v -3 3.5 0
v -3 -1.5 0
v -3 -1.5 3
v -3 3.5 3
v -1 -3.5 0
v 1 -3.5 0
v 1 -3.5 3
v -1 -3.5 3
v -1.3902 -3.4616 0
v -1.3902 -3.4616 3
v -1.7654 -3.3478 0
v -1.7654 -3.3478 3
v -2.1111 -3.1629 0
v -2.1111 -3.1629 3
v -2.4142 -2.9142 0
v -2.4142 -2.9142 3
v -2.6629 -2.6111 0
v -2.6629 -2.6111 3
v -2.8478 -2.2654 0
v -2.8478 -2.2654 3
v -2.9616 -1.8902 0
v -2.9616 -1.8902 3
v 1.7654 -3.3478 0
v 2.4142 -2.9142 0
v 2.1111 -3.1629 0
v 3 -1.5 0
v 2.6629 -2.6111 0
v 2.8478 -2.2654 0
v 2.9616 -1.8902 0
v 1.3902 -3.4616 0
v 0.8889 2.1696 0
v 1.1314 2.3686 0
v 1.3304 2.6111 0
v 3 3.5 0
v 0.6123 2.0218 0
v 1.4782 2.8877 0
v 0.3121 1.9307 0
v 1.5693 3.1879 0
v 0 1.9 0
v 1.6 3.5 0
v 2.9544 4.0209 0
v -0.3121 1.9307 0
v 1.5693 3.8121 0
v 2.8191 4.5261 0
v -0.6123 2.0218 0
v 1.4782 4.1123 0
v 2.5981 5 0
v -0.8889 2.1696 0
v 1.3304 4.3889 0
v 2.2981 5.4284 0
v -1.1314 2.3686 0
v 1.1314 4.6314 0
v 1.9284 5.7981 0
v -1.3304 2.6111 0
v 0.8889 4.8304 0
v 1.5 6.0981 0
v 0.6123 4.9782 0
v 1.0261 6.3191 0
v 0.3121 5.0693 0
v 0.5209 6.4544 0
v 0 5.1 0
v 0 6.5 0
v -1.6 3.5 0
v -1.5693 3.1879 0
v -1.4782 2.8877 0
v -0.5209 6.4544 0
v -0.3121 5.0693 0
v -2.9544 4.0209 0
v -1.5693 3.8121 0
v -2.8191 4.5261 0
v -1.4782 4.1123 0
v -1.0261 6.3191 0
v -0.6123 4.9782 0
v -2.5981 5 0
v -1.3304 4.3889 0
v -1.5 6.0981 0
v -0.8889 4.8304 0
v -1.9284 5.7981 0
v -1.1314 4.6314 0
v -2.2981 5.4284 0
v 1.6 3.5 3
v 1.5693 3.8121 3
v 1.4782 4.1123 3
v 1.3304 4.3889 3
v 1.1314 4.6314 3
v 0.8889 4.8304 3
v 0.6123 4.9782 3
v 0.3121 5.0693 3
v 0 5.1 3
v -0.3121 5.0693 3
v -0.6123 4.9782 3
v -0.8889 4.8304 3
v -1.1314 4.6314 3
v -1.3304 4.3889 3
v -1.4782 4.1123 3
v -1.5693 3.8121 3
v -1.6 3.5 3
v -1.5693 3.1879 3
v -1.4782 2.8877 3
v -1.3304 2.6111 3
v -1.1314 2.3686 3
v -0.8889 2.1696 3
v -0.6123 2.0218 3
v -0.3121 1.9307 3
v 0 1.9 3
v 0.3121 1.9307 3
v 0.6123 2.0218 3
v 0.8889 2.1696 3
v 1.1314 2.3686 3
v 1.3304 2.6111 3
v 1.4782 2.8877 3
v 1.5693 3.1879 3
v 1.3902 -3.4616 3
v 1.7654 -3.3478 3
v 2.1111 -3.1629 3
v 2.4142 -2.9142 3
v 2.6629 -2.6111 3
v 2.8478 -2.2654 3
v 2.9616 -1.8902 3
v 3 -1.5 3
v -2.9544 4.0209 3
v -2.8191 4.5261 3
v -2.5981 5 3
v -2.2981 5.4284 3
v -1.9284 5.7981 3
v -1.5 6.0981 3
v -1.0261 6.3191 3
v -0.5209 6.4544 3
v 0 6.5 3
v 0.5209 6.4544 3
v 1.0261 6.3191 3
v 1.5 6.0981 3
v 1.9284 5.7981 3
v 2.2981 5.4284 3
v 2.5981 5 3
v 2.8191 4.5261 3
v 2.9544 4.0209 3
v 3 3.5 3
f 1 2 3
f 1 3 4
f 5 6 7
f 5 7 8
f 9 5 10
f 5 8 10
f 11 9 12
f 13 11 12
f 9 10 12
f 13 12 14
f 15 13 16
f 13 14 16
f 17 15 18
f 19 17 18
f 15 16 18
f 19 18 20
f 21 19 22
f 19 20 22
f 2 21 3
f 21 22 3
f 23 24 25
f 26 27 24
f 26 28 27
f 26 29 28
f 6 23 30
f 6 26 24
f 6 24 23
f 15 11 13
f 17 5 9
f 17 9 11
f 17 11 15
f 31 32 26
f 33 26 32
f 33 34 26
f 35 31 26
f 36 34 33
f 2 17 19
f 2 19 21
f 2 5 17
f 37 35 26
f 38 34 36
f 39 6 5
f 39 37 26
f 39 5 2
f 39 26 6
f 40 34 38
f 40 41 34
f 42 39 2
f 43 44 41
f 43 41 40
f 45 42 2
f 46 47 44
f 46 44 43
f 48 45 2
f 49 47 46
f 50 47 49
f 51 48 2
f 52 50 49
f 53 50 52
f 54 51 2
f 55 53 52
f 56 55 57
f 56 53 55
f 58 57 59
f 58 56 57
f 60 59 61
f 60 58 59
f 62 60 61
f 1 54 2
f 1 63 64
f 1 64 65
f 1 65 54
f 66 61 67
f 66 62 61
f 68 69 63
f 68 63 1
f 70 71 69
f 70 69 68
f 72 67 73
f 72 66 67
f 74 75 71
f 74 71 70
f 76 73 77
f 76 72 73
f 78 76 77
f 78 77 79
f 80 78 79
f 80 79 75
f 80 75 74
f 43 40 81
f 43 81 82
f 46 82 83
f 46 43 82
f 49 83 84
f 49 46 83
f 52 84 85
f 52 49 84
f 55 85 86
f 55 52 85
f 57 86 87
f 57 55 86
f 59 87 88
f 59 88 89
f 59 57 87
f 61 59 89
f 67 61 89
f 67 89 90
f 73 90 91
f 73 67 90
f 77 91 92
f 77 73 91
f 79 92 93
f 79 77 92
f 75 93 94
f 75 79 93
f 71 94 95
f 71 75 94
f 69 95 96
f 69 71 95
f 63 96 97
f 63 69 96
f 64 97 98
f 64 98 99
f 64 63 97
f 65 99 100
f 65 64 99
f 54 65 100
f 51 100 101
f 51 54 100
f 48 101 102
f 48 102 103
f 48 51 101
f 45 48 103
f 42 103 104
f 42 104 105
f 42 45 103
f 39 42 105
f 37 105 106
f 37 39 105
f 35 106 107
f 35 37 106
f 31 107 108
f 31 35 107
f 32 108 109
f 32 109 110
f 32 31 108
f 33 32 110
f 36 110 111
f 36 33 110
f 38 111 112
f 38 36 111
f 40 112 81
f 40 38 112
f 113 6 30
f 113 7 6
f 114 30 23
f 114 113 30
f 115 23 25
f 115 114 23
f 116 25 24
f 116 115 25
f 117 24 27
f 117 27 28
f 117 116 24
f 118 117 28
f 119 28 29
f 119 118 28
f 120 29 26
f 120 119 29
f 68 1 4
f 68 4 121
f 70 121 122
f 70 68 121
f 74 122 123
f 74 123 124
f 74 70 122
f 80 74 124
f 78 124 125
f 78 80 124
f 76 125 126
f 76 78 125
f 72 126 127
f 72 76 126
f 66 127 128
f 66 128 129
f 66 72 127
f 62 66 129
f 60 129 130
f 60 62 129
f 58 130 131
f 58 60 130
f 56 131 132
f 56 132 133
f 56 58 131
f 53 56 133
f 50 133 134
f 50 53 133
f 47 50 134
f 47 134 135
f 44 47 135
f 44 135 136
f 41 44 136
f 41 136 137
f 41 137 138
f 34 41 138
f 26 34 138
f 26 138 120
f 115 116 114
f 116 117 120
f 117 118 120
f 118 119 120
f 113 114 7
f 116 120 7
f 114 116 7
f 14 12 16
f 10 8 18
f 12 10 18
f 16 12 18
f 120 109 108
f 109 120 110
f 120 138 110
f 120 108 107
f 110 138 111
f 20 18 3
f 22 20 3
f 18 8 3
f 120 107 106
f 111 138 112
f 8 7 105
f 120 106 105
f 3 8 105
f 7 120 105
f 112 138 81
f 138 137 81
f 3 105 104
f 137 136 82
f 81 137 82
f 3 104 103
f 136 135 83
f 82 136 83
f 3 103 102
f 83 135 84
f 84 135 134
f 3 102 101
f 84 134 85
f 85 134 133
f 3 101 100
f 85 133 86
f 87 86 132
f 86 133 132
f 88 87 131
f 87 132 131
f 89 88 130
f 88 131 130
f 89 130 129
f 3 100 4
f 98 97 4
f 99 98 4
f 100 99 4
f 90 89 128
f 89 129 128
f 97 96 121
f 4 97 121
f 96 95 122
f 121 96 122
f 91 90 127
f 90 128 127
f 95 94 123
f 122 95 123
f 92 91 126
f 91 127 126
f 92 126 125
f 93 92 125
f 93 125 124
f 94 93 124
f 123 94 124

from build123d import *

# Parameters (mm, degrees)
SKETCH_1_R      = 1.6
EXTRUDE_1_DEPTH = 3
FILLET_1_R      = 2


with BuildPart() as part:
    # ｽｹｯﾁ1 → ﾎﾞｽ - 押し出し1 (new body)
    with BuildSketch(Plane.XY):
        with BuildLine():
            Line((3, -3.5), (-3, -3.5))
            Line((-3, -3.5), (-3, 3.5))
            ThreePointArc((-3, 3.5), (0, 6.5), (3, 3.5))
            Line((3, 3.5), (3, -3.5))
        make_face()
        with Locations((0, 3.5)):
            Circle(SKETCH_1_R, mode=Mode.SUBTRACT)
    extrude(amount=EXTRUDE_1_DEPTH)

    # ﾌｨﾚｯﾄ1
    fillet_1_edges = [part.edges().sort_by_distance(p)[0] for p in [
        (3, -3.5, 1.5),
        (-3, -3.5, 1.5),
    ]]
    fillet(fillet_1_edges, radius=FILLET_1_R)


solid = part.part
